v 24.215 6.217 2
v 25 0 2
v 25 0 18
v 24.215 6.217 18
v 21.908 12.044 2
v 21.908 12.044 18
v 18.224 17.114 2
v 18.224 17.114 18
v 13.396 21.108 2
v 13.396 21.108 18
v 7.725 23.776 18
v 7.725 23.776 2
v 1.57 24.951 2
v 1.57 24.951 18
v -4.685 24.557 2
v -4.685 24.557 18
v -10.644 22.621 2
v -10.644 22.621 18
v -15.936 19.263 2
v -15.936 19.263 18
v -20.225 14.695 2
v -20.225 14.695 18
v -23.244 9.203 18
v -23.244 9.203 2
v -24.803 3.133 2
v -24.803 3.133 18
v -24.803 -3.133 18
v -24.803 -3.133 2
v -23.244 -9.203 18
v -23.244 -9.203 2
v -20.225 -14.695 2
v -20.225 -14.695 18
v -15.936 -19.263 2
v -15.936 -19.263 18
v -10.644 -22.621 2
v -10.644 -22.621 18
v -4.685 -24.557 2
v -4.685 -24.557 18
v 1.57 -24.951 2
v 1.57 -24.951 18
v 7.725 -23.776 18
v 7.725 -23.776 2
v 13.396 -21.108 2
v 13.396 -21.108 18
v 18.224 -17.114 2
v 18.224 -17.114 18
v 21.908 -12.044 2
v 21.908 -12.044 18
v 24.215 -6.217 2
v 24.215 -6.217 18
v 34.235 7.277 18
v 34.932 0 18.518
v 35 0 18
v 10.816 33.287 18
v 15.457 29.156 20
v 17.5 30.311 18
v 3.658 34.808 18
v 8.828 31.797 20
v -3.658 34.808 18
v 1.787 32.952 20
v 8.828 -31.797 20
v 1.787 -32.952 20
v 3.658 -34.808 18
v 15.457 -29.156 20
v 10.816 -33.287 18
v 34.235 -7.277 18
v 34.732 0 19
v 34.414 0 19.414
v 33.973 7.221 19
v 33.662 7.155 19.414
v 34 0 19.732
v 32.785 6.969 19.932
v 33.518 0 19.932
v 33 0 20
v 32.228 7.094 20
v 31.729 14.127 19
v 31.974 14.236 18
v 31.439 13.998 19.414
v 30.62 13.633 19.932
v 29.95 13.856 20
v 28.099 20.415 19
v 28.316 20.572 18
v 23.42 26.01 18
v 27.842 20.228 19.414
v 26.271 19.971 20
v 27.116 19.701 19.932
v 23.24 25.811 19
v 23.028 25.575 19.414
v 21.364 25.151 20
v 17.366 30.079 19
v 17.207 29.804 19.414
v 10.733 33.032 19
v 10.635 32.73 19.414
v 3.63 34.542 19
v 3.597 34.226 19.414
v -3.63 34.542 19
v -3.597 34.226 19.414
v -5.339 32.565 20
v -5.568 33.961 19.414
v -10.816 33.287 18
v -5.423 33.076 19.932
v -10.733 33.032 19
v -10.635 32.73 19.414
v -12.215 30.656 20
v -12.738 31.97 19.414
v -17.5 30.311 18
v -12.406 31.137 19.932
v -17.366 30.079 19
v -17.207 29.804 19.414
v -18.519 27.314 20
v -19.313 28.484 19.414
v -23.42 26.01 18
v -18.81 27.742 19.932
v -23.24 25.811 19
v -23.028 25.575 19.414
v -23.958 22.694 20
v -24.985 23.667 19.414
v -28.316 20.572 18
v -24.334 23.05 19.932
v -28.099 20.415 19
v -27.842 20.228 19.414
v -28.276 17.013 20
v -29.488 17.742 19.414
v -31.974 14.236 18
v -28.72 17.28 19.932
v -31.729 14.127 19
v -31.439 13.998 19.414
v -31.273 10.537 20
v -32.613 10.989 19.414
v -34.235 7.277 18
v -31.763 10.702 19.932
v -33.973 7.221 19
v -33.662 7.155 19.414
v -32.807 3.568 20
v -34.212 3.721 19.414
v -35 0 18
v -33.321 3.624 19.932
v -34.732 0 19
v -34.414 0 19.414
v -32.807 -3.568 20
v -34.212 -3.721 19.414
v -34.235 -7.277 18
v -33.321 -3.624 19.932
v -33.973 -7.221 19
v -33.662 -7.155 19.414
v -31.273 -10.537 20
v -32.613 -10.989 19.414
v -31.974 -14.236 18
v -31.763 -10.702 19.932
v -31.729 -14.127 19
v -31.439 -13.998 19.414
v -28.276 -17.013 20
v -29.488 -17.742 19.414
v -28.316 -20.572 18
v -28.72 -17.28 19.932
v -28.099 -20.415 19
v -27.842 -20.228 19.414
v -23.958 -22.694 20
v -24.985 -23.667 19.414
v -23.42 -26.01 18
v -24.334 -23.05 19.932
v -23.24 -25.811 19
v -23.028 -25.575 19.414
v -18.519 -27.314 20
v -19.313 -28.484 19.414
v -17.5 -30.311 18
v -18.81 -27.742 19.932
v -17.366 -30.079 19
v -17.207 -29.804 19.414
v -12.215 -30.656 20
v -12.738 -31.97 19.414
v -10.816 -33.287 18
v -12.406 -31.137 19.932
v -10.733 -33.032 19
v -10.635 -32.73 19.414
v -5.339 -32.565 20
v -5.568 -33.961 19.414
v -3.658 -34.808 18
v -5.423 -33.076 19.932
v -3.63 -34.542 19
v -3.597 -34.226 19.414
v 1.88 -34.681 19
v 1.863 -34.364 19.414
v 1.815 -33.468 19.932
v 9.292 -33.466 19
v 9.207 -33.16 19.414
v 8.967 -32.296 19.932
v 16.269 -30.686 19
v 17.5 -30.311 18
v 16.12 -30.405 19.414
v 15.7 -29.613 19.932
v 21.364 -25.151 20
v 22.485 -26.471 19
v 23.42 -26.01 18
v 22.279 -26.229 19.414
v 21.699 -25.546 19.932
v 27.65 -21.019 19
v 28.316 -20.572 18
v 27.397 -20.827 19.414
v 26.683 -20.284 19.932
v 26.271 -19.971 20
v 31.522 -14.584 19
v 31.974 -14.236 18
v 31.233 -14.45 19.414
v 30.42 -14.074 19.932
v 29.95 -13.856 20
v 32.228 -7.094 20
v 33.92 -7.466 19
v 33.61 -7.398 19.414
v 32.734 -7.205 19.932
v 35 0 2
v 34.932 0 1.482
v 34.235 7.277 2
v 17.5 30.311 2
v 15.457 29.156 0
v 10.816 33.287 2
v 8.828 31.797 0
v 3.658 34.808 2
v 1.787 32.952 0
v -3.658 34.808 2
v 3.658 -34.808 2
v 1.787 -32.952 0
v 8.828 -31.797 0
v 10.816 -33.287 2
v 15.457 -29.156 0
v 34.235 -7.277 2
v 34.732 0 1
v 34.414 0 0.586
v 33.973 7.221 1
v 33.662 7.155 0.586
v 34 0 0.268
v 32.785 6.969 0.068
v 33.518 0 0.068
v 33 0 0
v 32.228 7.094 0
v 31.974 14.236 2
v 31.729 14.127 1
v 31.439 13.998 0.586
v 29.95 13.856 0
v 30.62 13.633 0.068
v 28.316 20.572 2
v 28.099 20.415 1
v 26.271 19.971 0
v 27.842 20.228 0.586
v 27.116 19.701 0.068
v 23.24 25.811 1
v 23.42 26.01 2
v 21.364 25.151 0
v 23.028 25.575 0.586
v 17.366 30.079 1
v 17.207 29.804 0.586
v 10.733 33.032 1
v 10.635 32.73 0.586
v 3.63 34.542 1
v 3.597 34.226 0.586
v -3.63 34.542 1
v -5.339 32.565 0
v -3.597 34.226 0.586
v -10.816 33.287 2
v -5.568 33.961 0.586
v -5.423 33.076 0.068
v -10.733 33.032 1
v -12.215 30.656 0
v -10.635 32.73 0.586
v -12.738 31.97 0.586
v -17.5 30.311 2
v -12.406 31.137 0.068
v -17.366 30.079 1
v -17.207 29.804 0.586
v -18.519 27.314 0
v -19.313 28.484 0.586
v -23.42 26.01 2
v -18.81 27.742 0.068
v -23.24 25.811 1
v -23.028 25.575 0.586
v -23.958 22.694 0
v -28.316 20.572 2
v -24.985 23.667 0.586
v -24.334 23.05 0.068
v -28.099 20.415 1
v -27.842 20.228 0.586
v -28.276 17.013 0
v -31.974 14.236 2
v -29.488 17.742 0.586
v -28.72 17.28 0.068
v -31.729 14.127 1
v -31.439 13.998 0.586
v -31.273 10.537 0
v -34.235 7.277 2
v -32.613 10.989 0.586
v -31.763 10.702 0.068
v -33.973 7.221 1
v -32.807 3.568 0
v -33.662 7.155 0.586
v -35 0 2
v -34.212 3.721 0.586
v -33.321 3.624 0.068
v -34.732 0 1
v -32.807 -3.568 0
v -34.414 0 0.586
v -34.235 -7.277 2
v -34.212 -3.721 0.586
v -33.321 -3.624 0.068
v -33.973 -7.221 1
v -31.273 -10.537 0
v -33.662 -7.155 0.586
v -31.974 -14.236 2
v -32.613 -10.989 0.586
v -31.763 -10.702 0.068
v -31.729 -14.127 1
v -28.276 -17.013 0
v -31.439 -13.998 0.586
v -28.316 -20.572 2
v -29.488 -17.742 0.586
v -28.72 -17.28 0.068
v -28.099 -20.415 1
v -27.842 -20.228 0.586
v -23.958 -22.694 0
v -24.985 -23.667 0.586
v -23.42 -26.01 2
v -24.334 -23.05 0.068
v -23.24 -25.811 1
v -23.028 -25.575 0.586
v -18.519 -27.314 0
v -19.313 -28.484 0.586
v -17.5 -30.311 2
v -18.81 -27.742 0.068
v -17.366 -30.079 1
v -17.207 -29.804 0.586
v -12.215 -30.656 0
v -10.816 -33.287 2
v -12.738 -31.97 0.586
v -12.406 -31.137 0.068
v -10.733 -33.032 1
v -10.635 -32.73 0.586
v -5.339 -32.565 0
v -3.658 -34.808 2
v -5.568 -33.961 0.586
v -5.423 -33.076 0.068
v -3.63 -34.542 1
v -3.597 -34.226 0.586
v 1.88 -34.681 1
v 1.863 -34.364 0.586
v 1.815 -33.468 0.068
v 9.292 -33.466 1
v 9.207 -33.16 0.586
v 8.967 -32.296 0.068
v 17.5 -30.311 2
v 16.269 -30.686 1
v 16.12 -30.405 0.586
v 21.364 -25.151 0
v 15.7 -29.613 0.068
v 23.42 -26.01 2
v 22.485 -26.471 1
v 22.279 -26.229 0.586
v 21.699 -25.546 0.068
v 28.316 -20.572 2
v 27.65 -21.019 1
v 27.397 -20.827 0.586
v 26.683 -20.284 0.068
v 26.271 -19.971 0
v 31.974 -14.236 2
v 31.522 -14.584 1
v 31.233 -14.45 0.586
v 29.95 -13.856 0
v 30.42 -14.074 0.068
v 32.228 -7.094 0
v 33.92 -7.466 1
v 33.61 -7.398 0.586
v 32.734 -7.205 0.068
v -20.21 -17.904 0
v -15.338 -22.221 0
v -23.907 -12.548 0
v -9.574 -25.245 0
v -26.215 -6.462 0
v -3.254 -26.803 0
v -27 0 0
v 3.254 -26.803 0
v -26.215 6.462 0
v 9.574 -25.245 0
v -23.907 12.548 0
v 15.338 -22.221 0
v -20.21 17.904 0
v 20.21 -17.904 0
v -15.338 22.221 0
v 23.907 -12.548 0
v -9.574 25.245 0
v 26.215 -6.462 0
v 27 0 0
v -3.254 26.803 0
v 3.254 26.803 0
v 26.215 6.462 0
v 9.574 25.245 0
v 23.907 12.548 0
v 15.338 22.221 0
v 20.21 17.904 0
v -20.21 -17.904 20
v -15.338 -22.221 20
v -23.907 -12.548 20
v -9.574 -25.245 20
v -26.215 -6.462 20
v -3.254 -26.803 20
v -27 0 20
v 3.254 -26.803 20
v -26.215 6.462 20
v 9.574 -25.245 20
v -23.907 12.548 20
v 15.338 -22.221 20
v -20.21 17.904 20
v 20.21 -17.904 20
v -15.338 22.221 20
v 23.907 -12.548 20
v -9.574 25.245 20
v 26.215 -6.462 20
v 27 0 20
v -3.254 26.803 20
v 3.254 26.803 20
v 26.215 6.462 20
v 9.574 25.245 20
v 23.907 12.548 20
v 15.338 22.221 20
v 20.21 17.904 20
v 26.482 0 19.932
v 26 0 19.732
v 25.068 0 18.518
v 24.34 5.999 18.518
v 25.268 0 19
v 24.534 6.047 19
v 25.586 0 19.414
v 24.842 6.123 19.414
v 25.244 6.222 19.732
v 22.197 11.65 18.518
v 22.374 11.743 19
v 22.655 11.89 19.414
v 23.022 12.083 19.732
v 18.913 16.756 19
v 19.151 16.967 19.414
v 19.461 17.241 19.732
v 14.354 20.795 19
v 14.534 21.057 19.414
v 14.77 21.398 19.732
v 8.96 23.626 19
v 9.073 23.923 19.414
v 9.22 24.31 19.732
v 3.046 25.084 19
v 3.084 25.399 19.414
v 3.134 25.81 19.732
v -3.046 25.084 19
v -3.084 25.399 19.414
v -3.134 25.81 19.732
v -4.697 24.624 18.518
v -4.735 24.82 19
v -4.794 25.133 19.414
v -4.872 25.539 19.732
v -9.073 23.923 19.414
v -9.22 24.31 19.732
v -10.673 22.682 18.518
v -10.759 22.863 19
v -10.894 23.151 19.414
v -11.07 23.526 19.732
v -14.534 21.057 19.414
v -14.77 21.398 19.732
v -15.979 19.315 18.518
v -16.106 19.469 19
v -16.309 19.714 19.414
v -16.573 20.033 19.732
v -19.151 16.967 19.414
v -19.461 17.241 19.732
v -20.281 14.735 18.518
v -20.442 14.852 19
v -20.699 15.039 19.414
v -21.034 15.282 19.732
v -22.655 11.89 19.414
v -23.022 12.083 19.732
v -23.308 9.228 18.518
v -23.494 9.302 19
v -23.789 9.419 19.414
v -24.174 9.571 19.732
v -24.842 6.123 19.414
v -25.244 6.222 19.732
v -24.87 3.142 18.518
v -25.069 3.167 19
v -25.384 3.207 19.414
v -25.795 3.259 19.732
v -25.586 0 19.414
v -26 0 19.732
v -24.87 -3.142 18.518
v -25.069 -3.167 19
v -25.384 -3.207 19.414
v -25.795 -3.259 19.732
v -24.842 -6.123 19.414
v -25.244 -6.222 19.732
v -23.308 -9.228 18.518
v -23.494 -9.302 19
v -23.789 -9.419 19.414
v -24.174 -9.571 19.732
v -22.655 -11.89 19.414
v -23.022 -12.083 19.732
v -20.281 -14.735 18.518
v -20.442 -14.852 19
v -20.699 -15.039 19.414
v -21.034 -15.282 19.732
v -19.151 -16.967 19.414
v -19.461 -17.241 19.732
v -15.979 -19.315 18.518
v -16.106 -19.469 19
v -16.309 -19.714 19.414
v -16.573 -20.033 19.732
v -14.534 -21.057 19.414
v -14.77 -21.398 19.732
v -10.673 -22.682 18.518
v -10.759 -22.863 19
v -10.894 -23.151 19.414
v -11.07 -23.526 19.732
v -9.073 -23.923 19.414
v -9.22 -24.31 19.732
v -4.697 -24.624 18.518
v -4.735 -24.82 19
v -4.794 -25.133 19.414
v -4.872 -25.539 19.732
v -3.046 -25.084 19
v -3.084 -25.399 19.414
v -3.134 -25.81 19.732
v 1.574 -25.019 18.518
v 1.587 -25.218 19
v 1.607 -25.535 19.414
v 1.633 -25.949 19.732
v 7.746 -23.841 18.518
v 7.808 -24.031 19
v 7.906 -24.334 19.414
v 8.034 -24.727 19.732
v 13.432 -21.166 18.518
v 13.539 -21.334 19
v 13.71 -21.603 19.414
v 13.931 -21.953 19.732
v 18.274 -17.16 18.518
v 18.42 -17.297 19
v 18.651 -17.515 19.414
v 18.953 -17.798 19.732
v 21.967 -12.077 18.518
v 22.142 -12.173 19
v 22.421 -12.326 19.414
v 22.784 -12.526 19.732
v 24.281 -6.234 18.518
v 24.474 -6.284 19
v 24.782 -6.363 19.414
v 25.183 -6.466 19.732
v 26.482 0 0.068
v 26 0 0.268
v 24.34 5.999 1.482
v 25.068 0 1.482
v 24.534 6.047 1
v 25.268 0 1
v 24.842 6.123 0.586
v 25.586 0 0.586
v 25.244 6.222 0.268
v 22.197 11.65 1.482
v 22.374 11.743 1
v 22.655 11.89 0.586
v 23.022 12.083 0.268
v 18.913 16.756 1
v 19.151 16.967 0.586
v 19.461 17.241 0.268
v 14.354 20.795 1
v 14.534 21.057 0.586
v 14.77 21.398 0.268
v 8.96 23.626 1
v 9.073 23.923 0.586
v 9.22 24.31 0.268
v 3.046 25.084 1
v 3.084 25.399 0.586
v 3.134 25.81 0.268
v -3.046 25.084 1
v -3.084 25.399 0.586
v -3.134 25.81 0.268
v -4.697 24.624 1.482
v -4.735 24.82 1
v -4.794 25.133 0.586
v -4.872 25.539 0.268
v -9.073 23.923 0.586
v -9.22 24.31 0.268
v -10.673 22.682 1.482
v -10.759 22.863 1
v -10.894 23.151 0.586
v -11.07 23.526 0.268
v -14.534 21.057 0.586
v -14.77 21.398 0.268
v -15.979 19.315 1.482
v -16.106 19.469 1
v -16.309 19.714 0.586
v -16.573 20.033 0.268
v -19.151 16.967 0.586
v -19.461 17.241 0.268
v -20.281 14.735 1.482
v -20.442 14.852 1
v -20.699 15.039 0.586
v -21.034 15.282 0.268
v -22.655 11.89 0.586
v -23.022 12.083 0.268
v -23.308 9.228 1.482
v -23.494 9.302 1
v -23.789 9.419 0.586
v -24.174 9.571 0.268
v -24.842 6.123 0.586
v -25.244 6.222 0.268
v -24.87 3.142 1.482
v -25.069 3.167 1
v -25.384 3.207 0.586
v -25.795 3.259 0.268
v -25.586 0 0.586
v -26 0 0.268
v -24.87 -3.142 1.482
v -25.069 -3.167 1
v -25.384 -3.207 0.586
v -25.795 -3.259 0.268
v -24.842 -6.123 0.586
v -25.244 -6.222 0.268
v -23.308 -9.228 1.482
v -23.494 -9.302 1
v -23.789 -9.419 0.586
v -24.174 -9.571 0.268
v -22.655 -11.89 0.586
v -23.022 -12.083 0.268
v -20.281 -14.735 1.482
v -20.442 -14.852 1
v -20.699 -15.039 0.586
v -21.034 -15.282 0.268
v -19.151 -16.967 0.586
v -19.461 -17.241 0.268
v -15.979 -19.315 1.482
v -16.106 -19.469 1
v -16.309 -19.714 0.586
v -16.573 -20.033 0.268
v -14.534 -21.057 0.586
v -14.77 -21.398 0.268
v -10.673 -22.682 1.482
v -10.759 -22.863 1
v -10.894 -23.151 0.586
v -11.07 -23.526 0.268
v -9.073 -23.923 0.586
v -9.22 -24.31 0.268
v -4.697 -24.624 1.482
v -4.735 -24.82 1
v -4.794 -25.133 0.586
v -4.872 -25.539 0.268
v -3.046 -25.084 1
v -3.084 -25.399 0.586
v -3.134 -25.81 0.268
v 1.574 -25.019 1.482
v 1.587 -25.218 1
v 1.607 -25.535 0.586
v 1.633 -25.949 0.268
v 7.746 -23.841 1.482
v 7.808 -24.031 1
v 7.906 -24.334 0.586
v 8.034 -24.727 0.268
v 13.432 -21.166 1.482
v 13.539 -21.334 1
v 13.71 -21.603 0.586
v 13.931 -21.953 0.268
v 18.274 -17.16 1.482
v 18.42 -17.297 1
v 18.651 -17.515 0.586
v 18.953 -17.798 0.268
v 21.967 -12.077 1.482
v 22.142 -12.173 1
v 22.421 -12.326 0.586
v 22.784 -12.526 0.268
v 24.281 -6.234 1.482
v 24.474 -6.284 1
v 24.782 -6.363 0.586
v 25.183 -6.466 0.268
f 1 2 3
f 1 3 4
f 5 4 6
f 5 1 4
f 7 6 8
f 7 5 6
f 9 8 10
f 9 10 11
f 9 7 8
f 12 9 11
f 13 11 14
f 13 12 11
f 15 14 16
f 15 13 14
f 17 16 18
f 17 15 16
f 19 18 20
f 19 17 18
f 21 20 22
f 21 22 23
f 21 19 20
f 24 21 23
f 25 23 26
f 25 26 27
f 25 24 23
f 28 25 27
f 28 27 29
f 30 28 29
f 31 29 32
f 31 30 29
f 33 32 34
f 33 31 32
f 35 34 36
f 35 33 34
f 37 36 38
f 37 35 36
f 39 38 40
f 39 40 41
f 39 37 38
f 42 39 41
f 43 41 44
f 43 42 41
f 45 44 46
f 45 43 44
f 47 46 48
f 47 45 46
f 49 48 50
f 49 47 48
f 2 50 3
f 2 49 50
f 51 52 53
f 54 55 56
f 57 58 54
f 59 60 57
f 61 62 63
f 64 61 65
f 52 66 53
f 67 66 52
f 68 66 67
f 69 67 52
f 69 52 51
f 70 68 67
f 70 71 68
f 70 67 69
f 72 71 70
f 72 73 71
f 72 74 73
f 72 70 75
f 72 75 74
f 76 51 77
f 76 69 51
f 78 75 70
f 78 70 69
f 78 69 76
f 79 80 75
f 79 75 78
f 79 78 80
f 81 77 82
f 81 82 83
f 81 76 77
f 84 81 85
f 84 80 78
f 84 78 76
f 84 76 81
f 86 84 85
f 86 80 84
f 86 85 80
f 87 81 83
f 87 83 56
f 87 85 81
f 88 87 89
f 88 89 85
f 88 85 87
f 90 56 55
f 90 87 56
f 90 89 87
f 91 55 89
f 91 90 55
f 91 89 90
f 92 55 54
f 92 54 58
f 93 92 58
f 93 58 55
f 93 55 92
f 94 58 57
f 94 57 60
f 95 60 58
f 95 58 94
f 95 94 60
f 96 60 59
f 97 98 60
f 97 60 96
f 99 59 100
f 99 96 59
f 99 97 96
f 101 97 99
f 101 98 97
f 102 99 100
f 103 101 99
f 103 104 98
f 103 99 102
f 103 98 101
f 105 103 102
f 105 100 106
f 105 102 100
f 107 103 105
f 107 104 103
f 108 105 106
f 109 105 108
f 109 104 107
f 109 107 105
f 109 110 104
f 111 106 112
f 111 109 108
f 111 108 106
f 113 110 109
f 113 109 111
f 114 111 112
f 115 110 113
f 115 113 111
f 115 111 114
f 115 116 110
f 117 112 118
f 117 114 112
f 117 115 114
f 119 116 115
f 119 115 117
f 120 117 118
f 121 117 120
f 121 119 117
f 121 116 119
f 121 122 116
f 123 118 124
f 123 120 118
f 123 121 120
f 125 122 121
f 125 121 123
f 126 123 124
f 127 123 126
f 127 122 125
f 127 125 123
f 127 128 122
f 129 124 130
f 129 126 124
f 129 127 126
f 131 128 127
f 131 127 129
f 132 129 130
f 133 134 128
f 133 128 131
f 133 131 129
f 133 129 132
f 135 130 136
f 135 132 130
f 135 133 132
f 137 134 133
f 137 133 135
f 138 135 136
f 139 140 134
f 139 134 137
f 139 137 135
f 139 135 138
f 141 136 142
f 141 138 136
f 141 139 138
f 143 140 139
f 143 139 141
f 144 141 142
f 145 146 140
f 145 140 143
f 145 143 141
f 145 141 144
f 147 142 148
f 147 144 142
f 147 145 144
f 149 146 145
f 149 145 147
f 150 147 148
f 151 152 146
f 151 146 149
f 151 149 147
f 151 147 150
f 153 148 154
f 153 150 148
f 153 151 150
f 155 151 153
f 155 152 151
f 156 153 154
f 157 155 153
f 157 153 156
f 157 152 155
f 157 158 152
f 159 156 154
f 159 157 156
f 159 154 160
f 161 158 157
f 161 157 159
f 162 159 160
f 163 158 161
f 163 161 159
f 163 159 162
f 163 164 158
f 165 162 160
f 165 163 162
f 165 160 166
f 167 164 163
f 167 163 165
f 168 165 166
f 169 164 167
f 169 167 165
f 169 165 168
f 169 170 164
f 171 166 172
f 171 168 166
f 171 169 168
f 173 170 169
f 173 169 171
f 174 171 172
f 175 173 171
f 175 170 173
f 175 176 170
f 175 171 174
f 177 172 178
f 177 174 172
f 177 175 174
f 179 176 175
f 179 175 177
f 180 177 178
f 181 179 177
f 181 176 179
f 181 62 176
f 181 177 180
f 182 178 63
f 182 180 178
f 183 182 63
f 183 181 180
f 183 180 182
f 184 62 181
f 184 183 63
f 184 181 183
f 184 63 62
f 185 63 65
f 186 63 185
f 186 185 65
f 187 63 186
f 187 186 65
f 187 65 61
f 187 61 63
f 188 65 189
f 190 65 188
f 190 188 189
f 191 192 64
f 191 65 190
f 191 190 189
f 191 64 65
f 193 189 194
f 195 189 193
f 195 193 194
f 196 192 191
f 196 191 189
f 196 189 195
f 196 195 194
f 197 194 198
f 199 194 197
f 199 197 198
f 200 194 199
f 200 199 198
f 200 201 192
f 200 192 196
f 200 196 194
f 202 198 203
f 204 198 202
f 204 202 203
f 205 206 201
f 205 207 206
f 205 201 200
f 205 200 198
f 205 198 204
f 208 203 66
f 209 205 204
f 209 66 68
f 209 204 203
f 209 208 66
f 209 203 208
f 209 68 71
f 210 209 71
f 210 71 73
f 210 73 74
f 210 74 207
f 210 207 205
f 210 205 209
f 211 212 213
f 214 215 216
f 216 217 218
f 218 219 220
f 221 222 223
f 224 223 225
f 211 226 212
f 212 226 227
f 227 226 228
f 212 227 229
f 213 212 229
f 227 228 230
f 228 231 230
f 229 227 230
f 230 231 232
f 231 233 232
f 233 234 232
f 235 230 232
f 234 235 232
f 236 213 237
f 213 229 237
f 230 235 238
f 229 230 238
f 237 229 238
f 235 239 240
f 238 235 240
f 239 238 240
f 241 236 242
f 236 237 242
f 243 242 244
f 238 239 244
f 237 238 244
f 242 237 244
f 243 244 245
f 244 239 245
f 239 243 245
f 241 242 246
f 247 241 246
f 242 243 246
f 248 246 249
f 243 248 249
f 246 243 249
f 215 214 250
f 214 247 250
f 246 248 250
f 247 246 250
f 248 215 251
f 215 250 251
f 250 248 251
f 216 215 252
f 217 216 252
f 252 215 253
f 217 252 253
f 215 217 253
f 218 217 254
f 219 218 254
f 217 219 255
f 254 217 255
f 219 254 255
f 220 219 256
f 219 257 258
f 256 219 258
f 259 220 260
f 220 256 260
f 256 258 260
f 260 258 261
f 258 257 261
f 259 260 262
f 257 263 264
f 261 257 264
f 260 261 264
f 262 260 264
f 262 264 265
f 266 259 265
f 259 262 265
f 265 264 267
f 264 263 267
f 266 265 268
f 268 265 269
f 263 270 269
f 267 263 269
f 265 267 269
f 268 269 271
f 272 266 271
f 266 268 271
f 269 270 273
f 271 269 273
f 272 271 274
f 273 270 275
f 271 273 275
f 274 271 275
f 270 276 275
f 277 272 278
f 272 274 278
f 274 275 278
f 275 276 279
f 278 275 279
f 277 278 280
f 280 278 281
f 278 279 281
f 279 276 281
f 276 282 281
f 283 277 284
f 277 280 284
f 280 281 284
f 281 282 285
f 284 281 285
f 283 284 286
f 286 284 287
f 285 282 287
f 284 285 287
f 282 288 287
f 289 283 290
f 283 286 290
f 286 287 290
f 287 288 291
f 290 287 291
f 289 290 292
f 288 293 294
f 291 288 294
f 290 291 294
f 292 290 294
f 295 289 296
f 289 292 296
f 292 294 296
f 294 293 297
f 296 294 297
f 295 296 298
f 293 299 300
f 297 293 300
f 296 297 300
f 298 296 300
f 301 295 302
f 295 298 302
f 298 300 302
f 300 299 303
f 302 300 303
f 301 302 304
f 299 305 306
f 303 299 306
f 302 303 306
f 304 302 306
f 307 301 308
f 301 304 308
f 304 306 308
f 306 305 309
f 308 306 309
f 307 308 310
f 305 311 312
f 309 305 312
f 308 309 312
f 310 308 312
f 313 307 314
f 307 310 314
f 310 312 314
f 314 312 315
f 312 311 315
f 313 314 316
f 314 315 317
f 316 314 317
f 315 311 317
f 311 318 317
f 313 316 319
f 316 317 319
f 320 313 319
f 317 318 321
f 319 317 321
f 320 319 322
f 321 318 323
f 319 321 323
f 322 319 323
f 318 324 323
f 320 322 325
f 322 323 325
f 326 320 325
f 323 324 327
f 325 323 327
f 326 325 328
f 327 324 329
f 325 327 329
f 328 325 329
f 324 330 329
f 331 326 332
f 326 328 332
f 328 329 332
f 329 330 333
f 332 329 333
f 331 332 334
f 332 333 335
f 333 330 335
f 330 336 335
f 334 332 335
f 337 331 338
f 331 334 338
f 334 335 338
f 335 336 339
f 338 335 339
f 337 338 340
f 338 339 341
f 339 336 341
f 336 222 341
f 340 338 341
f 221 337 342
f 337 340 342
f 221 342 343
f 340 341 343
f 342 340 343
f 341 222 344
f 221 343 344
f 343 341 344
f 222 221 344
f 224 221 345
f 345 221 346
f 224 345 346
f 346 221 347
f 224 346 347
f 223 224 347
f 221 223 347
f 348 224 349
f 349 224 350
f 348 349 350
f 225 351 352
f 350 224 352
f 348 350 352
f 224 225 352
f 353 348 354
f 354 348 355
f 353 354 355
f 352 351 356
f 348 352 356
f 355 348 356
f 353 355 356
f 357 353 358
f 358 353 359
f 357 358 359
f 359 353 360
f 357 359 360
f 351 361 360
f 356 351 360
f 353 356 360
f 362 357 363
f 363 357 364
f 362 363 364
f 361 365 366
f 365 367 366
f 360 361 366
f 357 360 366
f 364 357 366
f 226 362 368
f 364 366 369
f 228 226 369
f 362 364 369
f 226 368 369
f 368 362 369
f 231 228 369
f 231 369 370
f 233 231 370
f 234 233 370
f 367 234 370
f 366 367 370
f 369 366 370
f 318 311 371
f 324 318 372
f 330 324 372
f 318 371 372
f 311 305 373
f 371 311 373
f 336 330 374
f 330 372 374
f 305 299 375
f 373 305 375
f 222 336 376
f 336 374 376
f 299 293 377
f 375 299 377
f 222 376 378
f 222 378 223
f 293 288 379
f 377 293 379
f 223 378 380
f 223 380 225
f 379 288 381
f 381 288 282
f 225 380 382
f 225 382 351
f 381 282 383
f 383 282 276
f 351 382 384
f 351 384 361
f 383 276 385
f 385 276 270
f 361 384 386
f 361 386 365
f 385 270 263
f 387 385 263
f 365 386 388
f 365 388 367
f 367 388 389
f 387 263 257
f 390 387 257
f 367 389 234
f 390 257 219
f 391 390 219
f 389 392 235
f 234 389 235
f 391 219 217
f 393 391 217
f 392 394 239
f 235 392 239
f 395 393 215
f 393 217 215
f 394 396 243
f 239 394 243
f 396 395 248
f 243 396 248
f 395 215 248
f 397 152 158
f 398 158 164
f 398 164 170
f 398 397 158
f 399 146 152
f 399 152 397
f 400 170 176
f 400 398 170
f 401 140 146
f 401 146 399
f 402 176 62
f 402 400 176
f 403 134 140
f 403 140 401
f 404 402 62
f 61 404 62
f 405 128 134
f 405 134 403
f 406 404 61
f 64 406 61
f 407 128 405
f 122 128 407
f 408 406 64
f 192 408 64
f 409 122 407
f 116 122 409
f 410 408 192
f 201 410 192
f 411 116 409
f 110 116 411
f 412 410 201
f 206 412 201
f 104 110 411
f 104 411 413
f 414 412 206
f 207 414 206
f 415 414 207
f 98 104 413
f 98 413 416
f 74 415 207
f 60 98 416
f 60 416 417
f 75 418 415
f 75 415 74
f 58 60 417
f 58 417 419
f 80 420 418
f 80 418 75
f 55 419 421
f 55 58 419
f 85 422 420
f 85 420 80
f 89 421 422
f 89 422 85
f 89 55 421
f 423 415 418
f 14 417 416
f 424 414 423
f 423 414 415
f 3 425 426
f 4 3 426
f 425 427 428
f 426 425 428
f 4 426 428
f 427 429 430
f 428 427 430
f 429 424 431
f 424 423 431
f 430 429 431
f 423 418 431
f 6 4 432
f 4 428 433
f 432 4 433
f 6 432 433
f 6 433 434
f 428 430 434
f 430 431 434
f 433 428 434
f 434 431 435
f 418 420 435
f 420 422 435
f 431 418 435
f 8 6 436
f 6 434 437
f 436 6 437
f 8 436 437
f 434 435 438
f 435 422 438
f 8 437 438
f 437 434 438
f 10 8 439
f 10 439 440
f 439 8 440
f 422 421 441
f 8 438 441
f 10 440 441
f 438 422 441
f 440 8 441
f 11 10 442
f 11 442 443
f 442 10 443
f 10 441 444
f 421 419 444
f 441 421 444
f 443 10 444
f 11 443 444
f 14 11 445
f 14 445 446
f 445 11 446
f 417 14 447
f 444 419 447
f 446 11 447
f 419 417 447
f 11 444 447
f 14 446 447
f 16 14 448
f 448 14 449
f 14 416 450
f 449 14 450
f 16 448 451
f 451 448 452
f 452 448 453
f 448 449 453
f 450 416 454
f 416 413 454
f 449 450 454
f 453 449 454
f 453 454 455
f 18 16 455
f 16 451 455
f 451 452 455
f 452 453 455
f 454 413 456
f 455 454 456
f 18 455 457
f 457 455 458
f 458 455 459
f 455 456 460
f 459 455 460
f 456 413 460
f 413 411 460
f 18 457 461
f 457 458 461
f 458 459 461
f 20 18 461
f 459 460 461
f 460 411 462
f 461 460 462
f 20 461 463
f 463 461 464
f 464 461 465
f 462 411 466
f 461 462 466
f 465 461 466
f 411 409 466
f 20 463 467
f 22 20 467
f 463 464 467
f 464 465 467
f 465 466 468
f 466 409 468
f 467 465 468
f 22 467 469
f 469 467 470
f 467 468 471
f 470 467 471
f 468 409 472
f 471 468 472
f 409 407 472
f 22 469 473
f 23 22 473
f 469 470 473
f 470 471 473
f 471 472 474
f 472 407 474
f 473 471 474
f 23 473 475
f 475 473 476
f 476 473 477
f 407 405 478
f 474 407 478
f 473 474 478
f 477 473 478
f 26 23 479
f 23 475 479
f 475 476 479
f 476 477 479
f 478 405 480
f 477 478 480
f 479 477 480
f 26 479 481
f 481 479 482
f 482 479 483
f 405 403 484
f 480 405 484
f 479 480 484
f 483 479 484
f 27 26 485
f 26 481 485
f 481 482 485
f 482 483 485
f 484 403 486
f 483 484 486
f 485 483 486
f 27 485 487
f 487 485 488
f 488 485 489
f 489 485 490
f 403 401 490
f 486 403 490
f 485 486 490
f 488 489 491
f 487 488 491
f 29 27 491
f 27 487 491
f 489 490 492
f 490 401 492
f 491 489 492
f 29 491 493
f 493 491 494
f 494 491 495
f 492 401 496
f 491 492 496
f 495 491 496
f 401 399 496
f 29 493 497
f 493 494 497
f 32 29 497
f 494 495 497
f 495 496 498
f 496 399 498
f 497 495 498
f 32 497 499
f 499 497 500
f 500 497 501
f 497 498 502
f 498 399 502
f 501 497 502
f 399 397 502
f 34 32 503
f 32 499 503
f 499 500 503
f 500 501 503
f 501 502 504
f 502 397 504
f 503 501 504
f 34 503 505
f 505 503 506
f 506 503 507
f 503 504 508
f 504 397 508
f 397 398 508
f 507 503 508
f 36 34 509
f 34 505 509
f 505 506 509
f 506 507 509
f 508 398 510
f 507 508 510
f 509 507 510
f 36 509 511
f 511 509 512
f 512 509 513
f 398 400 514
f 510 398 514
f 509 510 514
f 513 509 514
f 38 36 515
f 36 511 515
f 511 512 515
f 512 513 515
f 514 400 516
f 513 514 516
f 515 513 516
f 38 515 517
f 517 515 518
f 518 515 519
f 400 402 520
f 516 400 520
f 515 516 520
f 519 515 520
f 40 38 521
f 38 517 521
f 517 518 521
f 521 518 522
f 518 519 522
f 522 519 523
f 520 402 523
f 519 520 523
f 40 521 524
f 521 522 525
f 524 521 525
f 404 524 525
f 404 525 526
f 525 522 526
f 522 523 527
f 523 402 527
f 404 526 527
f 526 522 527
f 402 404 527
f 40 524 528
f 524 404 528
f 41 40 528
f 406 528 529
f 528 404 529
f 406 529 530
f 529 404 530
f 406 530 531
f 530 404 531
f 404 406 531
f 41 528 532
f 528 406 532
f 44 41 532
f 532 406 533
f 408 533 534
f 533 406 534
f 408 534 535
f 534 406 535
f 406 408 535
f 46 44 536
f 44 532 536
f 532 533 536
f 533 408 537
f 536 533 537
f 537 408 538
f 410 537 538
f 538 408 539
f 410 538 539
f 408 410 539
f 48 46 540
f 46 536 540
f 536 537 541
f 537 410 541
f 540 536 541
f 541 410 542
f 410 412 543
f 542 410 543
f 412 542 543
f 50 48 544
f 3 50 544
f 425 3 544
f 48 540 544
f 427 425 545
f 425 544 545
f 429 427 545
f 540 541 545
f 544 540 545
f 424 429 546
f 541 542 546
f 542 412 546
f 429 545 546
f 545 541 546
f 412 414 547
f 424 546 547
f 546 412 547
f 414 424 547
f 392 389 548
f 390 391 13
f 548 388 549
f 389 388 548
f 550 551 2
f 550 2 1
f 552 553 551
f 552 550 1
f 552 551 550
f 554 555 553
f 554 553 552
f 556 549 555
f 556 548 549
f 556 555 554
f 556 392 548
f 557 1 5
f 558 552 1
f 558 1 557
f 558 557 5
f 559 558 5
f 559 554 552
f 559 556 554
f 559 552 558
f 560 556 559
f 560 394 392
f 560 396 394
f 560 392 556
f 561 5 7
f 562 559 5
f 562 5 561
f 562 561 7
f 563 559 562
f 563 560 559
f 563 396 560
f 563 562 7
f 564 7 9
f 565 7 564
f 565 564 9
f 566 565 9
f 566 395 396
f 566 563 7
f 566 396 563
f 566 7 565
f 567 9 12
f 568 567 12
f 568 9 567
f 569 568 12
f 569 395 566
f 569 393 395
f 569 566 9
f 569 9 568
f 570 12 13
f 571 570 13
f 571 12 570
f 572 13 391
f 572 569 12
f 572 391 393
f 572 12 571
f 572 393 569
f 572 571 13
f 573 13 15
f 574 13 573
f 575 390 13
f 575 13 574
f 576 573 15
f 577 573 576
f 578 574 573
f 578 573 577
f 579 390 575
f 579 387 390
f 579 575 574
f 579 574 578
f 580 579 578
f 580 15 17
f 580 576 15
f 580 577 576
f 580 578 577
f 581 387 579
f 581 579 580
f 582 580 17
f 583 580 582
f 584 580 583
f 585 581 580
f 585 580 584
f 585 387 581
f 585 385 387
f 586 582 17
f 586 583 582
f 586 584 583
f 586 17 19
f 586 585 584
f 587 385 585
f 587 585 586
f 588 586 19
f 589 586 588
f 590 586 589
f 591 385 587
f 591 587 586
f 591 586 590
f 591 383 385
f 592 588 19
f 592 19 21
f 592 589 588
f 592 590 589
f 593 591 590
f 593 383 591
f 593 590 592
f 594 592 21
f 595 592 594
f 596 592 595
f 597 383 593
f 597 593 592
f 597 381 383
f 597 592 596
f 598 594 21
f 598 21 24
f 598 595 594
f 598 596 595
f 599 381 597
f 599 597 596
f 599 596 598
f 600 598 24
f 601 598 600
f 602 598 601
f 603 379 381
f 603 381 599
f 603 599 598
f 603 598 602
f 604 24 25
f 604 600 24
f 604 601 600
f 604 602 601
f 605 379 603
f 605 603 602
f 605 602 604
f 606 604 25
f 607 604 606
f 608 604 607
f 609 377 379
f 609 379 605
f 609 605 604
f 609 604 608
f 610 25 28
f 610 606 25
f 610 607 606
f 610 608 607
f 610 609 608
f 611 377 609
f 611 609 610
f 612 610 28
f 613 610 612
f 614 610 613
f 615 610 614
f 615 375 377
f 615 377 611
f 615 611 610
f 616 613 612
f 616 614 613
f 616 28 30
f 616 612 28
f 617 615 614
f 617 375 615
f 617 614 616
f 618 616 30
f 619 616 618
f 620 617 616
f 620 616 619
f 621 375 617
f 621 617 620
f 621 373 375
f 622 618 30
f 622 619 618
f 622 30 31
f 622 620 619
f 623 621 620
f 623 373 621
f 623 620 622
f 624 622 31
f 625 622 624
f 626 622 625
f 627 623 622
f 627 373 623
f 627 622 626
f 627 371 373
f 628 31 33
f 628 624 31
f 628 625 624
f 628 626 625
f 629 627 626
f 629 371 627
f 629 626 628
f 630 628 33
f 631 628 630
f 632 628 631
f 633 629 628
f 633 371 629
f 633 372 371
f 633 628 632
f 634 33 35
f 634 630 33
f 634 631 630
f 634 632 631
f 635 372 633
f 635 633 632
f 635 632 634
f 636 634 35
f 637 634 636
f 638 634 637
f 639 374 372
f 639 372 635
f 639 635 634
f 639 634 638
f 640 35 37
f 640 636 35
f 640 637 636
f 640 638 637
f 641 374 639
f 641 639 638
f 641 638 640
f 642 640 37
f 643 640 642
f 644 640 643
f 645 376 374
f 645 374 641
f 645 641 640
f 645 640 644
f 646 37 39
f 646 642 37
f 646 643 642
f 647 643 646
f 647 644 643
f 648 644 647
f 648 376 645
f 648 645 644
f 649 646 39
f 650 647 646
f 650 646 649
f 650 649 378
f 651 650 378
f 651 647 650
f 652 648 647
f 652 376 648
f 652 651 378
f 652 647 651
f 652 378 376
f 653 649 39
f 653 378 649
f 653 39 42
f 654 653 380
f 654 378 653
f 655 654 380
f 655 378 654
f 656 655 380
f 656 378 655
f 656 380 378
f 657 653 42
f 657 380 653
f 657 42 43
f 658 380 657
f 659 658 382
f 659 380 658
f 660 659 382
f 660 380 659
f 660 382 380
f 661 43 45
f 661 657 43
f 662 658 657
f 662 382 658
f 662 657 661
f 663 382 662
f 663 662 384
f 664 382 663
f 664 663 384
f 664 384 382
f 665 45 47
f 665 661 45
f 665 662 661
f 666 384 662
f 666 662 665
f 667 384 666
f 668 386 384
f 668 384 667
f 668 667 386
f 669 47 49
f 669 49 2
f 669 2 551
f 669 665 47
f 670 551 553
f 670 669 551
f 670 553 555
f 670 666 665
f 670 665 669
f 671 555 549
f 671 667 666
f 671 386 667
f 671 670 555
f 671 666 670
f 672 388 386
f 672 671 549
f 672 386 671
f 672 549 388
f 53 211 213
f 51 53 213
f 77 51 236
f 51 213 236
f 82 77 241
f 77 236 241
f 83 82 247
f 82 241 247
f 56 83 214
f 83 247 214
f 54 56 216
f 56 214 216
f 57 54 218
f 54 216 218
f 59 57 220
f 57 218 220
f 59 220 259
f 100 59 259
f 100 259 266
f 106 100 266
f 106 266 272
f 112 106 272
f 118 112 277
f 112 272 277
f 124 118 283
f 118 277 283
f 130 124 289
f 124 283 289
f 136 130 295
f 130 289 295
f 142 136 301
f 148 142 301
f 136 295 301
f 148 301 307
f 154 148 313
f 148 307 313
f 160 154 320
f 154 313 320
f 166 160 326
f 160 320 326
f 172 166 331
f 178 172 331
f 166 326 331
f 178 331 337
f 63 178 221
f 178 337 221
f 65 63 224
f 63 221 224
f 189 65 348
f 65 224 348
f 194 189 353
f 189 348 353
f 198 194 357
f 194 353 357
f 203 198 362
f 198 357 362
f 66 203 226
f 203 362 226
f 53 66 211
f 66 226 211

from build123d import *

# Parameters (mm, degrees)
IZIM1_R                     = 35
IZIM1_R_2                   = 25
Y_KSEKLIK_EKSTR_ZYON1_DEPTH = 20
RADYUS1_R                   = 2


with BuildPart() as part:
    # Çizim1 → Yükseklik-Ekstrüzyon1 (new body)
    with BuildSketch(Plane.XY):
        Circle(IZIM1_R)
        Circle(IZIM1_R_2, mode=Mode.SUBTRACT)
    extrude(amount=Y_KSEKLIK_EKSTR_ZYON1_DEPTH)

    # Radyus1
    radyus1_edges = [part.edges().sort_by_distance(p)[0] for p in [
        (-35, 0, 0),
        (-35, 0, 20),
        (-25, 0, 0),
        (-25, 0, 20),
    ]]
    fillet(radyus1_edges, radius=RADYUS1_R)


solid = part.part
